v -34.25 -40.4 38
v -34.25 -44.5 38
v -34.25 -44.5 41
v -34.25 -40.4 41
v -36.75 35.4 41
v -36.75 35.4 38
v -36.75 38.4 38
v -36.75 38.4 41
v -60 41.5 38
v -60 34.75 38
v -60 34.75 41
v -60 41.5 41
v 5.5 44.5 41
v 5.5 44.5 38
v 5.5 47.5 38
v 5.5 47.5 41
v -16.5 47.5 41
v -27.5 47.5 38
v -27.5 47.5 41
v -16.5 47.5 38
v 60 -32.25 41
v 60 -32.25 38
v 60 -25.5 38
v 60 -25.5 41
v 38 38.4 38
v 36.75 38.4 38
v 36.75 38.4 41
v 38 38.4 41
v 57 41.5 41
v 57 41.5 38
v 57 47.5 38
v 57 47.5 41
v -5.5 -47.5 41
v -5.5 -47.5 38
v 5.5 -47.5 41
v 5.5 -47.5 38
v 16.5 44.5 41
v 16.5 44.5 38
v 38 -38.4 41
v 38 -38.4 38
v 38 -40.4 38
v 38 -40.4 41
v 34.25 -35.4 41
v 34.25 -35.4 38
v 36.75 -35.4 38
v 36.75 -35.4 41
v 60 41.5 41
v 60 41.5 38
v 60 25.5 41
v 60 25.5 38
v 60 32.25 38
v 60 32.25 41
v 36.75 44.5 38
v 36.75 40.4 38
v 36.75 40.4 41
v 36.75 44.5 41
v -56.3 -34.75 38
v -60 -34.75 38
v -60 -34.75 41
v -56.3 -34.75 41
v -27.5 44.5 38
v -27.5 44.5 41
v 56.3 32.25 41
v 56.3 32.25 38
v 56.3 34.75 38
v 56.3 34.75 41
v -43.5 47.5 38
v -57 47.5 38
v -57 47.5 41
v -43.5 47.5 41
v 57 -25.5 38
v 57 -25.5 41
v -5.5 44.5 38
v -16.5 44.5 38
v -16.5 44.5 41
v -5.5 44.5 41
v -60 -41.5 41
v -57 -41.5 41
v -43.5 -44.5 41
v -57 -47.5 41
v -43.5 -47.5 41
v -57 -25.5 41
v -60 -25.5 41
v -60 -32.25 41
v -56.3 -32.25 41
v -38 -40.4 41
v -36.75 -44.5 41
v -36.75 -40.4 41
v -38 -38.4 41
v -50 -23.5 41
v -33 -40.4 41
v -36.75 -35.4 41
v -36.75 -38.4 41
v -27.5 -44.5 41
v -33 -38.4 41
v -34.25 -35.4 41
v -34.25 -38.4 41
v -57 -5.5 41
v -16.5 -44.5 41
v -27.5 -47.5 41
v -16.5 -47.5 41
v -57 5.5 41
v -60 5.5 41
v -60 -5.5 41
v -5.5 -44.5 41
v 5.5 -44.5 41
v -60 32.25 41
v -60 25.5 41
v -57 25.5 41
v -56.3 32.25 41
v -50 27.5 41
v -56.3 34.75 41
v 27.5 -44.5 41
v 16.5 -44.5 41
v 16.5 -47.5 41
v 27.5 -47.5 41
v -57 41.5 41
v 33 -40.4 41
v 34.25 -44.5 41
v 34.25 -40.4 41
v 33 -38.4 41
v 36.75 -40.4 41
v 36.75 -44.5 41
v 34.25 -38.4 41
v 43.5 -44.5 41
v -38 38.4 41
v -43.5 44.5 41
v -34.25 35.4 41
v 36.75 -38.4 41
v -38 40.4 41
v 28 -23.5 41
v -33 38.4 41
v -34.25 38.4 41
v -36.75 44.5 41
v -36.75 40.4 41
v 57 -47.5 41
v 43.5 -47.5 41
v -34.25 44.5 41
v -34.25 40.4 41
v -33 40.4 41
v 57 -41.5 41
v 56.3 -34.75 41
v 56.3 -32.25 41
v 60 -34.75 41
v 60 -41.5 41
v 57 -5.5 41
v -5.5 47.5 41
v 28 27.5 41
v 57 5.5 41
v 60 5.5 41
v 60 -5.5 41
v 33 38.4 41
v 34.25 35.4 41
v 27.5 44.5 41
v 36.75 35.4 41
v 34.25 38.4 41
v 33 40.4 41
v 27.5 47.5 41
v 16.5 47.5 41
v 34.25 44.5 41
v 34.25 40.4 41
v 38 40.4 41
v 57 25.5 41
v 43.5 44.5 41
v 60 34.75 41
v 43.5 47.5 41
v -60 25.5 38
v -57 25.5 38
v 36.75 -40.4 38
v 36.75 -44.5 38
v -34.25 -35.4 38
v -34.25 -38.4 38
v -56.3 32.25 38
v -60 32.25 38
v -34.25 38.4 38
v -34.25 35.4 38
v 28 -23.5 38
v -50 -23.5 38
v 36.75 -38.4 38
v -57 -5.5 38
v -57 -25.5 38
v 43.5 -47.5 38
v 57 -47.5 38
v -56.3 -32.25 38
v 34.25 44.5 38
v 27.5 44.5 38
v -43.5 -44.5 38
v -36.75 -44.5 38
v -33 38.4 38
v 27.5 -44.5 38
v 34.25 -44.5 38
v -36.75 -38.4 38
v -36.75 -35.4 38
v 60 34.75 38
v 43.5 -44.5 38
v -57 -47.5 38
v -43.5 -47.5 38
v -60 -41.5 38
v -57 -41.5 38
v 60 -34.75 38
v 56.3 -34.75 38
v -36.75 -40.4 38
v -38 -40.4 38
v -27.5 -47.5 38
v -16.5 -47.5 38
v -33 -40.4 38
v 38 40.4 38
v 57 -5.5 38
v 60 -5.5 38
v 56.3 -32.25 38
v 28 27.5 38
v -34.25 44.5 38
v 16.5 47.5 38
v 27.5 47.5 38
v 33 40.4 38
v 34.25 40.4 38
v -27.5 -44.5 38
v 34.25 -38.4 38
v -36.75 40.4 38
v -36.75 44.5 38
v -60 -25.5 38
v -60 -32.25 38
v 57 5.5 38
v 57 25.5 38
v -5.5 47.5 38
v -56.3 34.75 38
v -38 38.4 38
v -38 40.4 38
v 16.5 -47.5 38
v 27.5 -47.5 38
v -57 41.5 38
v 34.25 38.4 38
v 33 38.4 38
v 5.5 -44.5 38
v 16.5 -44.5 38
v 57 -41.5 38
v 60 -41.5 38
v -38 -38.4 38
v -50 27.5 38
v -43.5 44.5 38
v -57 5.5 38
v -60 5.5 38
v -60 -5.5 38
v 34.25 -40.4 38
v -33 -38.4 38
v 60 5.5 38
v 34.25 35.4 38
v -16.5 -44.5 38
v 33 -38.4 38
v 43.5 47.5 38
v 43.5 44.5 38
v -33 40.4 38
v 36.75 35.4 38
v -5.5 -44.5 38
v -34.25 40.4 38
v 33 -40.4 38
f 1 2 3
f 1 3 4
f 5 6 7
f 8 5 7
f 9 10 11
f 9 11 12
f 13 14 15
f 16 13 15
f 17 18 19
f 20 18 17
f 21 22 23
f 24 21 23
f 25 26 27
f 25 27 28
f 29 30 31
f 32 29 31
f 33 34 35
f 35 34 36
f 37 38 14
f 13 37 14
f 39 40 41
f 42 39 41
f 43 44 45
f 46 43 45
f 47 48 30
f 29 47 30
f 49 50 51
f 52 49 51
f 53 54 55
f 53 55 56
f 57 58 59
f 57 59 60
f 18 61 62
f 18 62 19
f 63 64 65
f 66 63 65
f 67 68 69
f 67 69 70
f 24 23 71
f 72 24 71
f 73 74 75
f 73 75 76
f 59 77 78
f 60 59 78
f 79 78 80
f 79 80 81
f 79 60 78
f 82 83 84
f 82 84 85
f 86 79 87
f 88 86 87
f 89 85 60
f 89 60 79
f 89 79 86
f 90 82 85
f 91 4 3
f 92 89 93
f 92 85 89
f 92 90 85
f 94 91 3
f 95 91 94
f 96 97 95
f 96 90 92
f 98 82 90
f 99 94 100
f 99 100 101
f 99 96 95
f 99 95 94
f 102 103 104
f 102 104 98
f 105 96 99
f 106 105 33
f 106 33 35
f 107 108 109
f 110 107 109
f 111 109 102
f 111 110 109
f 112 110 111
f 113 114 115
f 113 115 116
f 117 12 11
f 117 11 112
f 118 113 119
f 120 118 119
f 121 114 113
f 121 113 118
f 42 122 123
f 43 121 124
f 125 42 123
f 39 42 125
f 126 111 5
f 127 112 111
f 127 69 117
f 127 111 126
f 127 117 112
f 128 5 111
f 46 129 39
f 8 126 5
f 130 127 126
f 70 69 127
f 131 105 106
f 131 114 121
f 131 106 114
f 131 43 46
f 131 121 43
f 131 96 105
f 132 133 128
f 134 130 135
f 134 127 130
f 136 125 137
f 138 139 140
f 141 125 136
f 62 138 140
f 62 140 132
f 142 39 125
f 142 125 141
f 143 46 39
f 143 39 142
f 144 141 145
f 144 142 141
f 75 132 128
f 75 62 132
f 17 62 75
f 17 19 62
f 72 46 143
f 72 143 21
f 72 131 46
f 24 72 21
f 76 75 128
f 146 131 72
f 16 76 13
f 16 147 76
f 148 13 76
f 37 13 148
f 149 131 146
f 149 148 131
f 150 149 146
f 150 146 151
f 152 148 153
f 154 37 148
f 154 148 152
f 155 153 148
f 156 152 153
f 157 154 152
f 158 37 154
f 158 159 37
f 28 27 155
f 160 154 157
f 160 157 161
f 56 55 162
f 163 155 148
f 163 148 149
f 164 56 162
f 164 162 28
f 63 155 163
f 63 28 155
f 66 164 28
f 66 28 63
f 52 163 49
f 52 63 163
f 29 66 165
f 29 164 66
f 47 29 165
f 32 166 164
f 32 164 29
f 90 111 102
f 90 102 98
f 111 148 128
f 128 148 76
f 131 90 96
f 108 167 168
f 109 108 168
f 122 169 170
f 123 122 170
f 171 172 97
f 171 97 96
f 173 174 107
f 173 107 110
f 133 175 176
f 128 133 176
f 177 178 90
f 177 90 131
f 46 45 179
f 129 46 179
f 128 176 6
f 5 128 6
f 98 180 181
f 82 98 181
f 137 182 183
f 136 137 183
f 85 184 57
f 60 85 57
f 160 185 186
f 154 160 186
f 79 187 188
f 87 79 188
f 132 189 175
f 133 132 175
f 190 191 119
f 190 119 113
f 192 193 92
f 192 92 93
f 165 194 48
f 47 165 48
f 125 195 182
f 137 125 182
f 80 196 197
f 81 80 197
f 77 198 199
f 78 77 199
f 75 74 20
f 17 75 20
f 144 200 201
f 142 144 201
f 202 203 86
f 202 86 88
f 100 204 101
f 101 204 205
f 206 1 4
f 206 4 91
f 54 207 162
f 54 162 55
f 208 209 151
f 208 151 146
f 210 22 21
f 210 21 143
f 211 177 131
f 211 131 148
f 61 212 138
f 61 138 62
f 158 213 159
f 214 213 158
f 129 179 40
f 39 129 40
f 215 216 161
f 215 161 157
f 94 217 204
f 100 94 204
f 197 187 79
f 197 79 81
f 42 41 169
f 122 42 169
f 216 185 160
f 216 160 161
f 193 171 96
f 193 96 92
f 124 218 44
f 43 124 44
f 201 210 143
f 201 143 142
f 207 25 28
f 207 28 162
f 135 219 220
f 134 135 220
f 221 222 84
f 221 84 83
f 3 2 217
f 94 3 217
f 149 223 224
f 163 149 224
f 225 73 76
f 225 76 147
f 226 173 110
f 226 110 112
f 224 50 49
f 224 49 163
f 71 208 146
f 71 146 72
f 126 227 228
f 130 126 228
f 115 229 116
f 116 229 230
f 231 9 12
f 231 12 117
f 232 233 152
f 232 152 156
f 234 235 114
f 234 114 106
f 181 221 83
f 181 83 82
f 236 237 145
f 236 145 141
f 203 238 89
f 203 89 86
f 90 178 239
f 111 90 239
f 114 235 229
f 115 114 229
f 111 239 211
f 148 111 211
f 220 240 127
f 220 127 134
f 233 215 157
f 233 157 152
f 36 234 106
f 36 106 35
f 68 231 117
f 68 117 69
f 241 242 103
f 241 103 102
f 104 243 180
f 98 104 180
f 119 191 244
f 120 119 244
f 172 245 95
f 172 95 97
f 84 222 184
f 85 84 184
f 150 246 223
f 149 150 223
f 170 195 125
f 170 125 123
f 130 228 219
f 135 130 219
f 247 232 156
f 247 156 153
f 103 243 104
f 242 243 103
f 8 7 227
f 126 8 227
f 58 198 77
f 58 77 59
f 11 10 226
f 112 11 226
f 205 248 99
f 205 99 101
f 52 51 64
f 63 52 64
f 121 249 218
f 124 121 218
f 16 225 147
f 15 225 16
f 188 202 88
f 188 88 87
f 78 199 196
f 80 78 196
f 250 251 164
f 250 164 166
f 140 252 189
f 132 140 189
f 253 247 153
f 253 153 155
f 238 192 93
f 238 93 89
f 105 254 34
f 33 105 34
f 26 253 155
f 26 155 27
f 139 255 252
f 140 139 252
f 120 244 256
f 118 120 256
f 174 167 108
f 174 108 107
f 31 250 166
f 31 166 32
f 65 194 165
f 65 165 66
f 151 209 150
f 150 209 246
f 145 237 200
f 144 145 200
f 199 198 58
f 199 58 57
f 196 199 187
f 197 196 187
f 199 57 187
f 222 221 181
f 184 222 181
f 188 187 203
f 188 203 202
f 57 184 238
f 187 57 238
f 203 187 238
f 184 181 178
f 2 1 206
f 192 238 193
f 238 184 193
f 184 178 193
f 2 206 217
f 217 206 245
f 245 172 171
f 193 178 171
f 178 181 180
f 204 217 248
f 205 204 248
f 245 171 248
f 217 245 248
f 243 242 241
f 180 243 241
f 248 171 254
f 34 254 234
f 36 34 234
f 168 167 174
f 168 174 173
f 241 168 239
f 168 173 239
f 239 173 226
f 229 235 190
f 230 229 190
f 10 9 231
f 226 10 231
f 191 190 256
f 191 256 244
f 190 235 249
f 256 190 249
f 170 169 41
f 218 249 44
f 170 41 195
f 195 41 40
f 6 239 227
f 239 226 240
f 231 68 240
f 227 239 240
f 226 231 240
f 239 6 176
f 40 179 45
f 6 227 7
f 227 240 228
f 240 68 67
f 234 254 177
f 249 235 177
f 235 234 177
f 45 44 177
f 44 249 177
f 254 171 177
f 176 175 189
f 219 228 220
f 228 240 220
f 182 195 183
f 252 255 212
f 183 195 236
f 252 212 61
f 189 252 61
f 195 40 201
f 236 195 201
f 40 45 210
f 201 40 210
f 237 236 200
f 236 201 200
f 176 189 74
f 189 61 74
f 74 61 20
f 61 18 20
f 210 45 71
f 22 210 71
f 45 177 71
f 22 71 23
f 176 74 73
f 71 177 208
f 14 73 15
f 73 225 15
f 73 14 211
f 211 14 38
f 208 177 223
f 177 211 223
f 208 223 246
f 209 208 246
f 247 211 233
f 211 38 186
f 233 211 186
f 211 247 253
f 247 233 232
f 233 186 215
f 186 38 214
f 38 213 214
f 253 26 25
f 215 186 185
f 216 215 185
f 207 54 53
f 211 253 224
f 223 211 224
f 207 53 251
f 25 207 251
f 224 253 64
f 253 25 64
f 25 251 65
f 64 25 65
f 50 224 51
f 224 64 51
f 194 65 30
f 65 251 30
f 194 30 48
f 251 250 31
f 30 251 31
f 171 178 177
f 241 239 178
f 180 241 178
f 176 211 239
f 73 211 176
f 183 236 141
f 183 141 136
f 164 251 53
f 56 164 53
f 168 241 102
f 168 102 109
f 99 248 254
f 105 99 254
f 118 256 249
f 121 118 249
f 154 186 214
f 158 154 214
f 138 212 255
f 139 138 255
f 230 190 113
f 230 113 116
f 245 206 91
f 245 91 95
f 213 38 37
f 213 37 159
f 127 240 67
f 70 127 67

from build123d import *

# Parameters (mm, degrees)
SKETCH004_W                   = 120
SKETCH004_H                   = 95
PAD001_DEPTH                  = 3
SKETCH005_W                   = 3
SKETCH005_H                   = 6
SKETCH005_H_2                 = 20
SKETCH005_W_2                 = 16
SKETCH005_H_3                 = 3
SKETCH005_W_3                 = 11
POCKET003_DEPTH               = 309.164355
SKETCH005_MIRRORED006_2_W     = 3
SKETCH005_MIRRORED006_2_H     = 6
SKETCH005_MIRRORED006_2_H_2   = 20
SKETCH005_MIRRORED006_2_W_2   = 16
SKETCH005_MIRRORED006_2_H_3   = 3
SKETCH005_MIRRORED006_2_W_3   = 11
POCKET003_MIRRORED006_2_DEPTH = 309.164355
SKETCH006_W                   = 3.7
SKETCH006_H                   = 2.5
POCKET004_DEPTH               = 309.164355
SKETCH006_MIRRORED008_2_W     = 3.7
SKETCH006_MIRRORED008_2_H     = 2.5
POCKET004_MIRRORED008_2_DEPTH = 309.164355
SKETCH007_W                   = 78
SKETCH007_H                   = 51
POCKET005_DEPTH               = 3.001


with BuildPart() as part:
    # Sketch004 → Pad001 (new body)
    with BuildSketch(Plane.XY):
        Rectangle(SKETCH004_W, SKETCH004_H)
    extrude(amount=PAD001_DEPTH)

    # Sketch005 → Pocket003 (cut, through all)
    with BuildSketch(Plane.XY):
        with Locations((-58.5, 44.5)):
            Rectangle(SKETCH005_W, SKETCH005_H)
        with Locations((-58.5, 15.5)):
            Rectangle(SKETCH005_W, SKETCH005_H_2)
        with Locations((-35.5, 46)):
            Rectangle(SKETCH005_W_2, SKETCH005_H_3)
        with Locations((-11, 46)):
            Rectangle(SKETCH005_W_3, SKETCH005_H_3)
    pocket003 = extrude(amount=POCKET003_DEPTH, mode=Mode.SUBTRACT)

    # Sketch005 Mirrored006 2 → Pocket003 Mirrored006 2 (cut, through all)
    with BuildSketch(Plane(origin=(0, 0, 0), x_dir=(-1, 0, 0), z_dir=(0, 0, -1))):
        with Locations((-58.5, 44.5)):
            Rectangle(SKETCH005_MIRRORED006_2_W, SKETCH005_MIRRORED006_2_H)
        with Locations((-58.5, 15.5)):
            Rectangle(SKETCH005_MIRRORED006_2_W, SKETCH005_MIRRORED006_2_H_2)
        with Locations((-35.5, 46)):
            Rectangle(SKETCH005_MIRRORED006_2_W_2, SKETCH005_MIRRORED006_2_H_3)
        with Locations((-11, 46)):
            Rectangle(SKETCH005_MIRRORED006_2_W_3, SKETCH005_MIRRORED006_2_H_3)
    pocket003_mirrored006_2 = extrude(amount=-POCKET003_MIRRORED006_2_DEPTH, mode=Mode.SUBTRACT)

    # Mirrored007: Pocket003, Pocket003 Mirrored006 2 across Sketch005 H_Axis
    add(pocket003.mirror(Plane.ZX), mode=Mode.SUBTRACT)
    add(pocket003_mirrored006_2.mirror(Plane.ZX), mode=Mode.SUBTRACT)

    # Sketch006 → Pocket004 (cut, through all)
    with BuildSketch(Plane.XY):
        with Locations((-58.15, 33.5)):
            Rectangle(SKETCH006_W, SKETCH006_H)
        Polygon((-36.75, 47.5), (-34.25, 47.5), (-34.25, 40.4), (-33, 40.4), (-33, 38.4), (-34.25, 38.4), (-34.25, 35.4), (-36.75, 35.4), (-36.75, 38.4), (-38, 38.4), (-38, 40.4), (-36.75, 40.4), align=None)
    pocket004 = extrude(amount=POCKET004_DEPTH, mode=Mode.SUBTRACT)

    # Sketch006 Mirrored008 2 → Pocket004 Mirrored008 2 (cut, through all)
    with BuildSketch(Plane(origin=(0, 0, 0), x_dir=(-1, 0, 0), z_dir=(0, 0, -1))):
        with Locations((-58.15, 33.5)):
            Rectangle(SKETCH006_MIRRORED008_2_W, SKETCH006_MIRRORED008_2_H)
        Polygon((-36.75, 47.5), (-34.25, 47.5), (-34.25, 40.4), (-33, 40.4), (-33, 38.4), (-34.25, 38.4), (-34.25, 35.4), (-36.75, 35.4), (-36.75, 38.4), (-38, 38.4), (-38, 40.4), (-36.75, 40.4), align=None)
    pocket004_mirrored008_2 = extrude(amount=-POCKET004_MIRRORED008_2_DEPTH, mode=Mode.SUBTRACT)

    # Mirrored009: Pocket004, Pocket004 Mirrored008 2 across Sketch006 H_Axis
    add(pocket004.mirror(Plane.ZX), mode=Mode.SUBTRACT)
    add(pocket004_mirrored008_2.mirror(Plane.ZX), mode=Mode.SUBTRACT)

    # Sketch007 → Pocket005 (cut, through all)
    with BuildSketch(Plane.XY):
        with Locations((-11, 2)):
            Rectangle(SKETCH007_W, SKETCH007_H)
    extrude(amount=POCKET005_DEPTH, mode=Mode.SUBTRACT)


with BuildPart() as part_1:
    # Body001 placement: moved
    add(part.part.moved(Location((0, 0, 38))))


solid = part_1.part
